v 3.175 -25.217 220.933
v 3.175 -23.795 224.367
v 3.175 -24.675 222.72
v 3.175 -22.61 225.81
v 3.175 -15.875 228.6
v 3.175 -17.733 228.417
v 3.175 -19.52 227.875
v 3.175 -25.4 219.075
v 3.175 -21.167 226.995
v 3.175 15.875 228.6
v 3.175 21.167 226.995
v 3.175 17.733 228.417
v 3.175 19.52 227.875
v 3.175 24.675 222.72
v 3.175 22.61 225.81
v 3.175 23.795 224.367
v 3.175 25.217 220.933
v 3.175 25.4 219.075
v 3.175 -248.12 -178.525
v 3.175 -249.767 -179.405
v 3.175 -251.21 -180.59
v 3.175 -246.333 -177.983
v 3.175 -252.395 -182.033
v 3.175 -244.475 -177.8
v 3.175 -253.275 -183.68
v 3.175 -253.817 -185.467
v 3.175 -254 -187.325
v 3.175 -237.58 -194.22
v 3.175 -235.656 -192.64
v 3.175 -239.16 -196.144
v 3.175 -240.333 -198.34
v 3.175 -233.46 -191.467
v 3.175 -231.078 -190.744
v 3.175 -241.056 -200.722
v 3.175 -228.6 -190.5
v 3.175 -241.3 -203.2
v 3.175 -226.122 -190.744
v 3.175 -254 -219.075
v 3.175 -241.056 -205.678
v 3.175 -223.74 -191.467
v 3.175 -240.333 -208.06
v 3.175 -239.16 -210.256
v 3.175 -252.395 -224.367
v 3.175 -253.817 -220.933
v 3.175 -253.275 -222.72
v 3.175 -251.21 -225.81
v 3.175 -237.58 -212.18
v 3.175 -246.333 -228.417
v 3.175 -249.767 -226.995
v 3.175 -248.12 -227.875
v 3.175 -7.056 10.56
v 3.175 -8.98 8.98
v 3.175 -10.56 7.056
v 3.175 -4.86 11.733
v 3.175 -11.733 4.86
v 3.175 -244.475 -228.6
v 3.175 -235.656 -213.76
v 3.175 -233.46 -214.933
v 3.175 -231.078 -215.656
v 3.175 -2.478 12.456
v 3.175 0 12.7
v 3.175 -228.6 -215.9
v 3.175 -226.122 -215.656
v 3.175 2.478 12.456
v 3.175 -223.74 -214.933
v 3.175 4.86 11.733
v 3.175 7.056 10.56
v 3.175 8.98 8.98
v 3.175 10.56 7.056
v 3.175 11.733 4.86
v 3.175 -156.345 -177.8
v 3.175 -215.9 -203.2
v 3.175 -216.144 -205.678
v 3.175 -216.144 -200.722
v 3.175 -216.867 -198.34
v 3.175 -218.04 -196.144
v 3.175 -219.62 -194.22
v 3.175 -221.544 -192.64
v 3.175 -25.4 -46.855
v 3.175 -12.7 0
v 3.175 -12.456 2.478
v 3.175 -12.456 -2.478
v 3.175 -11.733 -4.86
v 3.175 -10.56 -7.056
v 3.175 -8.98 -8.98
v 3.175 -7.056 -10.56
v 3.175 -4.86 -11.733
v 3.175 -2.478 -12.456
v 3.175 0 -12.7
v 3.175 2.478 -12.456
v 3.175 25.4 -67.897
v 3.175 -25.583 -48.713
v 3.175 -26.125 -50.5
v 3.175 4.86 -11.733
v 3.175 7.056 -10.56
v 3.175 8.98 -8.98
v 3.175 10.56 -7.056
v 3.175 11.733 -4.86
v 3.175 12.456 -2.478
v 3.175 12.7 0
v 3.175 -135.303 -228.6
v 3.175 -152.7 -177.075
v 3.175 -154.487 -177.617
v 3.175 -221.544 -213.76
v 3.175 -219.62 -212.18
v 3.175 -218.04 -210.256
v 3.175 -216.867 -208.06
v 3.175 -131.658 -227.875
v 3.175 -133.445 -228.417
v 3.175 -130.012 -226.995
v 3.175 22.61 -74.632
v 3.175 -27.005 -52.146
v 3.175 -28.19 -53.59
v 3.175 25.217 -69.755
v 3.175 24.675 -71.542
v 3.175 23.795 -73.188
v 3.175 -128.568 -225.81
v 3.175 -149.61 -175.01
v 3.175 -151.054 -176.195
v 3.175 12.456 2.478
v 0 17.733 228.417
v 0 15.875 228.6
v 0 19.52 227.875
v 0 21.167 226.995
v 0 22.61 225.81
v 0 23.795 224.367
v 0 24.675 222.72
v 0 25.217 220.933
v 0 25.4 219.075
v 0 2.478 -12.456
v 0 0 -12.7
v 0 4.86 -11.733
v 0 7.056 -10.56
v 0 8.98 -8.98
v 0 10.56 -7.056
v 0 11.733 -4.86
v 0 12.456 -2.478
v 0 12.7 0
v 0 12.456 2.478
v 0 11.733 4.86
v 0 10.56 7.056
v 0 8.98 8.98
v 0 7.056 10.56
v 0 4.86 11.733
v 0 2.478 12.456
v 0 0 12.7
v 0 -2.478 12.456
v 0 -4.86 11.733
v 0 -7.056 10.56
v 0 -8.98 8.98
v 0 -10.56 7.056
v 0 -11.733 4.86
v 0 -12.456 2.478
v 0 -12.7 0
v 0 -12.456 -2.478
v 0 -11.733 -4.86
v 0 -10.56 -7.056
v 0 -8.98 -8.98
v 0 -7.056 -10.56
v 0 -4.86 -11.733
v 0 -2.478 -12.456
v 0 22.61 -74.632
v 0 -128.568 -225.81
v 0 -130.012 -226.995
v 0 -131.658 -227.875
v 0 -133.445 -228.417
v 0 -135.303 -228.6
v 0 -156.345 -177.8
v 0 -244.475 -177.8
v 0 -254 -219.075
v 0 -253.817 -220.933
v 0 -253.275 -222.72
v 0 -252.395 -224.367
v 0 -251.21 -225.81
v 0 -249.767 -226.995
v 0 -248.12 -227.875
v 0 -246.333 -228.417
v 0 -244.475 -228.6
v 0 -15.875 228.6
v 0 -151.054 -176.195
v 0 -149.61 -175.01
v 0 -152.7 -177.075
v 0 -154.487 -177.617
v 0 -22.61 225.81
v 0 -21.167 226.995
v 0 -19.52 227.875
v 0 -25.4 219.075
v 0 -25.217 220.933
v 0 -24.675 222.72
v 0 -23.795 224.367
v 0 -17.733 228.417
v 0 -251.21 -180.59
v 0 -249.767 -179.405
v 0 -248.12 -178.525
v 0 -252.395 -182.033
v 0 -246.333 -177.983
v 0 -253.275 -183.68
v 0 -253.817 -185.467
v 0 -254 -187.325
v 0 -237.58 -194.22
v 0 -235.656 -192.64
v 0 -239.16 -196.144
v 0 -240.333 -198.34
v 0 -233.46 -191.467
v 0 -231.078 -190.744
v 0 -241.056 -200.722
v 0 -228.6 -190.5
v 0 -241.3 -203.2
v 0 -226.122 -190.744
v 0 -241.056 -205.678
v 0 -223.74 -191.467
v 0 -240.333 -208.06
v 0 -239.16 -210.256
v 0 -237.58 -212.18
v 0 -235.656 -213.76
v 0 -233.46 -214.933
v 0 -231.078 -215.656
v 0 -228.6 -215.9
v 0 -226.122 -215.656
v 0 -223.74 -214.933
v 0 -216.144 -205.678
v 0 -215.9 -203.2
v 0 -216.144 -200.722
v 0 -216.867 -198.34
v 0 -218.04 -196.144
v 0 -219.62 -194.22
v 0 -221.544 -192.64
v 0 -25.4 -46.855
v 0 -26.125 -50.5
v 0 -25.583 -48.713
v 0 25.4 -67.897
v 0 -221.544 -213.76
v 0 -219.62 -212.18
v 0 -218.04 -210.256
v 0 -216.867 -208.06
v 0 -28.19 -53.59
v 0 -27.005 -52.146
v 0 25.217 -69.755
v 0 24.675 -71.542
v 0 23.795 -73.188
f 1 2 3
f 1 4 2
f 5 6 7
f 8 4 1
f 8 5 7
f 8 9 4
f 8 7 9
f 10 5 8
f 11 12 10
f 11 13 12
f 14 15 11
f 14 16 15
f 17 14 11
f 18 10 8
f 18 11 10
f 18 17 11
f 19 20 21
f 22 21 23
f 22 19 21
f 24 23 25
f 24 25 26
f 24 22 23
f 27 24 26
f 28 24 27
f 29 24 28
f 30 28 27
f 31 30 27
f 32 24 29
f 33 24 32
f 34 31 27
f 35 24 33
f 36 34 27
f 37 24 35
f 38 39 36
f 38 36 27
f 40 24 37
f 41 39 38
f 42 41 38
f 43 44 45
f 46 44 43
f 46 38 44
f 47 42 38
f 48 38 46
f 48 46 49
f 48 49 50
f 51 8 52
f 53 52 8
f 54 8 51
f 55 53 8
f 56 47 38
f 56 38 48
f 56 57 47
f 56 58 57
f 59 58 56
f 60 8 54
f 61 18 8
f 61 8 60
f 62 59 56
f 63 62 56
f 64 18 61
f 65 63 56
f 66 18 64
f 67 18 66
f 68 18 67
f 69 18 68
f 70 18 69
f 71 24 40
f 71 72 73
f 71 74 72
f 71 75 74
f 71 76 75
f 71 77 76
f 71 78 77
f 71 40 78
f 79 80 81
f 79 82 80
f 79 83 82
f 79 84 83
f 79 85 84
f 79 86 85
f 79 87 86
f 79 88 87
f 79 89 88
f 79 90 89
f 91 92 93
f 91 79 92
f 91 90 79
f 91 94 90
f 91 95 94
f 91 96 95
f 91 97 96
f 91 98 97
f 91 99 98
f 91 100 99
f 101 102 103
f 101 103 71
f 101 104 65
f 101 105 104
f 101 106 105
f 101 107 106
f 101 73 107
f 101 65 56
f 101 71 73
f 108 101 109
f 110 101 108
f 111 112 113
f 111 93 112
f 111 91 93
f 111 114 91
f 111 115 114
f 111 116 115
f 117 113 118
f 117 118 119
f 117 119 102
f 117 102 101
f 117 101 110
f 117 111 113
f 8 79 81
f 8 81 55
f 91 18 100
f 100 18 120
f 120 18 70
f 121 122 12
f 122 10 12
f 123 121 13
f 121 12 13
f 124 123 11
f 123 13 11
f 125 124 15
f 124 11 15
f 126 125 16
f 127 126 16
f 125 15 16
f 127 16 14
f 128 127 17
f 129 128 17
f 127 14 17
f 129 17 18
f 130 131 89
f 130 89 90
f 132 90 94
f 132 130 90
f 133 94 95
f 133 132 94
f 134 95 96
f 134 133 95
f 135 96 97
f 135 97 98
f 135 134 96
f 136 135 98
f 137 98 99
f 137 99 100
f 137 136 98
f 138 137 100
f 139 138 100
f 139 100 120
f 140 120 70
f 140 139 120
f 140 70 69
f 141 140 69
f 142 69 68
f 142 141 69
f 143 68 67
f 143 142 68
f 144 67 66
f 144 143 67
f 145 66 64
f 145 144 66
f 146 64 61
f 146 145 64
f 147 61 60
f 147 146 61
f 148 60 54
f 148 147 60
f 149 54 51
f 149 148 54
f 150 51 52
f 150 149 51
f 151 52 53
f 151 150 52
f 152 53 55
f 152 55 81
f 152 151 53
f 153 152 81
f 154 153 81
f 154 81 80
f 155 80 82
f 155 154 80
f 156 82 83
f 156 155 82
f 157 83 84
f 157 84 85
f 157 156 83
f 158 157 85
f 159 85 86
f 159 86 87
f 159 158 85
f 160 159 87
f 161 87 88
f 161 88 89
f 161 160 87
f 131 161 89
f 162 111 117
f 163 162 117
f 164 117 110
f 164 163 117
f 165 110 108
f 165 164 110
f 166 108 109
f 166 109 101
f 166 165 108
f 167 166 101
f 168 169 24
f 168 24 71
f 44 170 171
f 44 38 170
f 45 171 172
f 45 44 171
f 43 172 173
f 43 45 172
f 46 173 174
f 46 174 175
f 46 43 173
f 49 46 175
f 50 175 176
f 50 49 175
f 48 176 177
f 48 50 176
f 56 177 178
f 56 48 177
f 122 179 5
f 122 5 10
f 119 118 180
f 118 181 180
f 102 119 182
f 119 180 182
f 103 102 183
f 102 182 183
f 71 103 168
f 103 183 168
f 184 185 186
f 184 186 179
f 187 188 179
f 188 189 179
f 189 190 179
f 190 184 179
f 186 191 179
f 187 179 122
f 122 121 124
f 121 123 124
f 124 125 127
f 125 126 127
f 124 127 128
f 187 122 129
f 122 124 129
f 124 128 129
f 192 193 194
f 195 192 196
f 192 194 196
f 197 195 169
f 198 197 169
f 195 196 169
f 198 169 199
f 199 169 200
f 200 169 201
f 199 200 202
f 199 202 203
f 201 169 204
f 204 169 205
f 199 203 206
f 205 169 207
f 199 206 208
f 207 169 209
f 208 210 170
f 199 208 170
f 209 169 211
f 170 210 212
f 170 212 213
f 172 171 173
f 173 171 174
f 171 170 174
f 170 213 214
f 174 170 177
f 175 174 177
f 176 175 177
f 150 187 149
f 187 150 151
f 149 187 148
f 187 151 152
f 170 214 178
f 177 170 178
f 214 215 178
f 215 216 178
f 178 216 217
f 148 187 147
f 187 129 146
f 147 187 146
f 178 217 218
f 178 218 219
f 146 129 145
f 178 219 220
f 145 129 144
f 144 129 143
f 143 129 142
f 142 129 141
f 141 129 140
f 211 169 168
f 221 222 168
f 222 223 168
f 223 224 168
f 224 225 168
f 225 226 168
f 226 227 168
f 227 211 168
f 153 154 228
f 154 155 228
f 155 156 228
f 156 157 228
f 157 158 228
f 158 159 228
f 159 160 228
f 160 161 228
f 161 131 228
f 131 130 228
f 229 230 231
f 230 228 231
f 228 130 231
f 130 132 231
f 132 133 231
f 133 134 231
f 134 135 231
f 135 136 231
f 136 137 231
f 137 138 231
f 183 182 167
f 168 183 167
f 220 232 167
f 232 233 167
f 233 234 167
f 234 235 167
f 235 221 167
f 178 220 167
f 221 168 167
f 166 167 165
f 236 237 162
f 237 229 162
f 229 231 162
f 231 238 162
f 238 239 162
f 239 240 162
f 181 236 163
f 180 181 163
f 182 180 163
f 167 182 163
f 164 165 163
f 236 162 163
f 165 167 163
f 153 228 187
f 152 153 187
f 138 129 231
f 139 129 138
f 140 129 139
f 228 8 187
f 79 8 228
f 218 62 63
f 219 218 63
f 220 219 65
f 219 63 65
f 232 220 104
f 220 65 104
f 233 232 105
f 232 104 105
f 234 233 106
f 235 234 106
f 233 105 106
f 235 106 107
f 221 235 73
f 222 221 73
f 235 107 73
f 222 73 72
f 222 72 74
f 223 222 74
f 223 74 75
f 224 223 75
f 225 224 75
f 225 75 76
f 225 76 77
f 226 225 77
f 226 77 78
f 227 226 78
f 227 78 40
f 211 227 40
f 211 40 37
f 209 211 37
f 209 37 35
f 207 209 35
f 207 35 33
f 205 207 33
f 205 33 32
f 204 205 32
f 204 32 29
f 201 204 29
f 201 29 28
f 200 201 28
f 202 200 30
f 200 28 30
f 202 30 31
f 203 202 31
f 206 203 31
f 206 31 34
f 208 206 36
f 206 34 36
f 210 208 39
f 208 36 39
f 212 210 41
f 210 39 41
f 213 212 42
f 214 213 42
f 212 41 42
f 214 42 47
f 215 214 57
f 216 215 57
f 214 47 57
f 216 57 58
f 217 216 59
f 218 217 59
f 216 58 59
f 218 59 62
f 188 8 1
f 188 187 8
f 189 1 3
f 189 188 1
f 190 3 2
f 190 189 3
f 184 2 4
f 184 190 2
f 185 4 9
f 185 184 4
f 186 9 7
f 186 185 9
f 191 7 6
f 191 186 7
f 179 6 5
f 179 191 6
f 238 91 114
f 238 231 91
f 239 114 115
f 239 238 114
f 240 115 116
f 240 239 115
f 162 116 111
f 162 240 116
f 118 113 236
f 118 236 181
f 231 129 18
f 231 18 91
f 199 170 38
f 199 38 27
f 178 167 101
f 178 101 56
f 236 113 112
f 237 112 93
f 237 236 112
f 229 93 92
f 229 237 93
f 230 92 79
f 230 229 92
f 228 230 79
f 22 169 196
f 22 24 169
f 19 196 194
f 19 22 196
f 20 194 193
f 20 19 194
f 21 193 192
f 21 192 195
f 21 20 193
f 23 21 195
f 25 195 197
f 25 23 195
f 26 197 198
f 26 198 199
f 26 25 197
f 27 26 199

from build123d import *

# Parameters (mm, degrees)
SKETCH1_R           = 12.7
BOSS_EXTRUDE1_DEPTH = 3.175
SKETCH3_R           = 12.7
CUT_EXTRUDE1_DEPTH  = 4.175
SKETCH4_W           = 50.8
SKETCH4_H           = 228.6
CUT_EXTRUDE2_DEPTH  = 4.175
BOSS_EXTRUDE2_DEPTH = 3.175
CUT_EXTRUDE3_DEPTH  = 4.175
FILLET1_R           = 9.525


with BuildPart() as part:
    # Sketch1 → Boss-Extrude1 (new body)
    with BuildSketch(Plane(origin=(0, 0, 0), x_dir=(0, 0, -1), z_dir=(1, 0, 0))):
        Polygon((-228.6, 25.4), (228.6, 25.4), (228.6, -254), (177.8, -254), (177.8, -25.4), (-177.8, -25.4), (-177.8, -254), (-228.6, -254), align=None)
        Circle(SKETCH1_R, mode=Mode.SUBTRACT)
    extrude(amount=BOSS_EXTRUDE1_DEPTH)

    # Sketch3 → Cut-Extrude1 (cut, through all)
    with BuildSketch(Plane(origin=(3.175, 0, 0), x_dir=(0, 0, -1), z_dir=(1, 0, 0))):
        with Locations((-203.2, -228.6)):
            Circle(SKETCH3_R)
        with Locations((203.2, -228.6)):
            Circle(SKETCH3_R)
    extrude(amount=-CUT_EXTRUDE1_DEPTH, mode=Mode.SUBTRACT)

    # Sketch4 → Cut-Extrude2 (cut, through all)
    with BuildSketch(Plane(origin=(3.175, 0, 0), x_dir=(0, 0, -1), z_dir=(1, 0, 0))):
        with Locations((-203.2, -139.7)):
            Rectangle(SKETCH4_W, SKETCH4_H)
    extrude(amount=-CUT_EXTRUDE2_DEPTH, mode=Mode.SUBTRACT)

    # Sketch5 → Boss-Extrude2 (add)
    with BuildSketch(Plane(origin=(3.175, 0, 0), x_dir=(0, 0, -1), z_dir=(1, 0, 0))):
        Polygon((50.8, -25.4), (177.8, -152.4), (177.8, -25.4), align=None)
    extrude(amount=-BOSS_EXTRUDE2_DEPTH)

    # Sketch6 → Cut-Extrude3 (cut, through all)
    with BuildSketch(Plane(origin=(3.175, 0, 0), x_dir=(0, 0, -1), z_dir=(1, 0, 0))):
        Polygon((71.842048969, 25.4), (228.6, -131.357951031), (228.6, 25.4), align=None)
    extrude(amount=-CUT_EXTRUDE3_DEPTH, mode=Mode.SUBTRACT)

    # Fillet1
    fillet1_edges = [part.edges().sort_by_distance(p)[0] for p in [
        (1.5875, 25.4, 228.6),
        (1.5875, -254, -228.6),
        (1.5875, -254, -177.8),
        (1.5875, -25.4, 228.6),
        (1.5875, -25.4, -50.8),
        (1.5875, -152.4, -177.8),
        (1.5875, 25.4, -71.842048969),
        (1.5875, -131.357951031, -228.6),
    ]]
    fillet(fillet1_edges, radius=FILLET1_R)


solid = part.part
